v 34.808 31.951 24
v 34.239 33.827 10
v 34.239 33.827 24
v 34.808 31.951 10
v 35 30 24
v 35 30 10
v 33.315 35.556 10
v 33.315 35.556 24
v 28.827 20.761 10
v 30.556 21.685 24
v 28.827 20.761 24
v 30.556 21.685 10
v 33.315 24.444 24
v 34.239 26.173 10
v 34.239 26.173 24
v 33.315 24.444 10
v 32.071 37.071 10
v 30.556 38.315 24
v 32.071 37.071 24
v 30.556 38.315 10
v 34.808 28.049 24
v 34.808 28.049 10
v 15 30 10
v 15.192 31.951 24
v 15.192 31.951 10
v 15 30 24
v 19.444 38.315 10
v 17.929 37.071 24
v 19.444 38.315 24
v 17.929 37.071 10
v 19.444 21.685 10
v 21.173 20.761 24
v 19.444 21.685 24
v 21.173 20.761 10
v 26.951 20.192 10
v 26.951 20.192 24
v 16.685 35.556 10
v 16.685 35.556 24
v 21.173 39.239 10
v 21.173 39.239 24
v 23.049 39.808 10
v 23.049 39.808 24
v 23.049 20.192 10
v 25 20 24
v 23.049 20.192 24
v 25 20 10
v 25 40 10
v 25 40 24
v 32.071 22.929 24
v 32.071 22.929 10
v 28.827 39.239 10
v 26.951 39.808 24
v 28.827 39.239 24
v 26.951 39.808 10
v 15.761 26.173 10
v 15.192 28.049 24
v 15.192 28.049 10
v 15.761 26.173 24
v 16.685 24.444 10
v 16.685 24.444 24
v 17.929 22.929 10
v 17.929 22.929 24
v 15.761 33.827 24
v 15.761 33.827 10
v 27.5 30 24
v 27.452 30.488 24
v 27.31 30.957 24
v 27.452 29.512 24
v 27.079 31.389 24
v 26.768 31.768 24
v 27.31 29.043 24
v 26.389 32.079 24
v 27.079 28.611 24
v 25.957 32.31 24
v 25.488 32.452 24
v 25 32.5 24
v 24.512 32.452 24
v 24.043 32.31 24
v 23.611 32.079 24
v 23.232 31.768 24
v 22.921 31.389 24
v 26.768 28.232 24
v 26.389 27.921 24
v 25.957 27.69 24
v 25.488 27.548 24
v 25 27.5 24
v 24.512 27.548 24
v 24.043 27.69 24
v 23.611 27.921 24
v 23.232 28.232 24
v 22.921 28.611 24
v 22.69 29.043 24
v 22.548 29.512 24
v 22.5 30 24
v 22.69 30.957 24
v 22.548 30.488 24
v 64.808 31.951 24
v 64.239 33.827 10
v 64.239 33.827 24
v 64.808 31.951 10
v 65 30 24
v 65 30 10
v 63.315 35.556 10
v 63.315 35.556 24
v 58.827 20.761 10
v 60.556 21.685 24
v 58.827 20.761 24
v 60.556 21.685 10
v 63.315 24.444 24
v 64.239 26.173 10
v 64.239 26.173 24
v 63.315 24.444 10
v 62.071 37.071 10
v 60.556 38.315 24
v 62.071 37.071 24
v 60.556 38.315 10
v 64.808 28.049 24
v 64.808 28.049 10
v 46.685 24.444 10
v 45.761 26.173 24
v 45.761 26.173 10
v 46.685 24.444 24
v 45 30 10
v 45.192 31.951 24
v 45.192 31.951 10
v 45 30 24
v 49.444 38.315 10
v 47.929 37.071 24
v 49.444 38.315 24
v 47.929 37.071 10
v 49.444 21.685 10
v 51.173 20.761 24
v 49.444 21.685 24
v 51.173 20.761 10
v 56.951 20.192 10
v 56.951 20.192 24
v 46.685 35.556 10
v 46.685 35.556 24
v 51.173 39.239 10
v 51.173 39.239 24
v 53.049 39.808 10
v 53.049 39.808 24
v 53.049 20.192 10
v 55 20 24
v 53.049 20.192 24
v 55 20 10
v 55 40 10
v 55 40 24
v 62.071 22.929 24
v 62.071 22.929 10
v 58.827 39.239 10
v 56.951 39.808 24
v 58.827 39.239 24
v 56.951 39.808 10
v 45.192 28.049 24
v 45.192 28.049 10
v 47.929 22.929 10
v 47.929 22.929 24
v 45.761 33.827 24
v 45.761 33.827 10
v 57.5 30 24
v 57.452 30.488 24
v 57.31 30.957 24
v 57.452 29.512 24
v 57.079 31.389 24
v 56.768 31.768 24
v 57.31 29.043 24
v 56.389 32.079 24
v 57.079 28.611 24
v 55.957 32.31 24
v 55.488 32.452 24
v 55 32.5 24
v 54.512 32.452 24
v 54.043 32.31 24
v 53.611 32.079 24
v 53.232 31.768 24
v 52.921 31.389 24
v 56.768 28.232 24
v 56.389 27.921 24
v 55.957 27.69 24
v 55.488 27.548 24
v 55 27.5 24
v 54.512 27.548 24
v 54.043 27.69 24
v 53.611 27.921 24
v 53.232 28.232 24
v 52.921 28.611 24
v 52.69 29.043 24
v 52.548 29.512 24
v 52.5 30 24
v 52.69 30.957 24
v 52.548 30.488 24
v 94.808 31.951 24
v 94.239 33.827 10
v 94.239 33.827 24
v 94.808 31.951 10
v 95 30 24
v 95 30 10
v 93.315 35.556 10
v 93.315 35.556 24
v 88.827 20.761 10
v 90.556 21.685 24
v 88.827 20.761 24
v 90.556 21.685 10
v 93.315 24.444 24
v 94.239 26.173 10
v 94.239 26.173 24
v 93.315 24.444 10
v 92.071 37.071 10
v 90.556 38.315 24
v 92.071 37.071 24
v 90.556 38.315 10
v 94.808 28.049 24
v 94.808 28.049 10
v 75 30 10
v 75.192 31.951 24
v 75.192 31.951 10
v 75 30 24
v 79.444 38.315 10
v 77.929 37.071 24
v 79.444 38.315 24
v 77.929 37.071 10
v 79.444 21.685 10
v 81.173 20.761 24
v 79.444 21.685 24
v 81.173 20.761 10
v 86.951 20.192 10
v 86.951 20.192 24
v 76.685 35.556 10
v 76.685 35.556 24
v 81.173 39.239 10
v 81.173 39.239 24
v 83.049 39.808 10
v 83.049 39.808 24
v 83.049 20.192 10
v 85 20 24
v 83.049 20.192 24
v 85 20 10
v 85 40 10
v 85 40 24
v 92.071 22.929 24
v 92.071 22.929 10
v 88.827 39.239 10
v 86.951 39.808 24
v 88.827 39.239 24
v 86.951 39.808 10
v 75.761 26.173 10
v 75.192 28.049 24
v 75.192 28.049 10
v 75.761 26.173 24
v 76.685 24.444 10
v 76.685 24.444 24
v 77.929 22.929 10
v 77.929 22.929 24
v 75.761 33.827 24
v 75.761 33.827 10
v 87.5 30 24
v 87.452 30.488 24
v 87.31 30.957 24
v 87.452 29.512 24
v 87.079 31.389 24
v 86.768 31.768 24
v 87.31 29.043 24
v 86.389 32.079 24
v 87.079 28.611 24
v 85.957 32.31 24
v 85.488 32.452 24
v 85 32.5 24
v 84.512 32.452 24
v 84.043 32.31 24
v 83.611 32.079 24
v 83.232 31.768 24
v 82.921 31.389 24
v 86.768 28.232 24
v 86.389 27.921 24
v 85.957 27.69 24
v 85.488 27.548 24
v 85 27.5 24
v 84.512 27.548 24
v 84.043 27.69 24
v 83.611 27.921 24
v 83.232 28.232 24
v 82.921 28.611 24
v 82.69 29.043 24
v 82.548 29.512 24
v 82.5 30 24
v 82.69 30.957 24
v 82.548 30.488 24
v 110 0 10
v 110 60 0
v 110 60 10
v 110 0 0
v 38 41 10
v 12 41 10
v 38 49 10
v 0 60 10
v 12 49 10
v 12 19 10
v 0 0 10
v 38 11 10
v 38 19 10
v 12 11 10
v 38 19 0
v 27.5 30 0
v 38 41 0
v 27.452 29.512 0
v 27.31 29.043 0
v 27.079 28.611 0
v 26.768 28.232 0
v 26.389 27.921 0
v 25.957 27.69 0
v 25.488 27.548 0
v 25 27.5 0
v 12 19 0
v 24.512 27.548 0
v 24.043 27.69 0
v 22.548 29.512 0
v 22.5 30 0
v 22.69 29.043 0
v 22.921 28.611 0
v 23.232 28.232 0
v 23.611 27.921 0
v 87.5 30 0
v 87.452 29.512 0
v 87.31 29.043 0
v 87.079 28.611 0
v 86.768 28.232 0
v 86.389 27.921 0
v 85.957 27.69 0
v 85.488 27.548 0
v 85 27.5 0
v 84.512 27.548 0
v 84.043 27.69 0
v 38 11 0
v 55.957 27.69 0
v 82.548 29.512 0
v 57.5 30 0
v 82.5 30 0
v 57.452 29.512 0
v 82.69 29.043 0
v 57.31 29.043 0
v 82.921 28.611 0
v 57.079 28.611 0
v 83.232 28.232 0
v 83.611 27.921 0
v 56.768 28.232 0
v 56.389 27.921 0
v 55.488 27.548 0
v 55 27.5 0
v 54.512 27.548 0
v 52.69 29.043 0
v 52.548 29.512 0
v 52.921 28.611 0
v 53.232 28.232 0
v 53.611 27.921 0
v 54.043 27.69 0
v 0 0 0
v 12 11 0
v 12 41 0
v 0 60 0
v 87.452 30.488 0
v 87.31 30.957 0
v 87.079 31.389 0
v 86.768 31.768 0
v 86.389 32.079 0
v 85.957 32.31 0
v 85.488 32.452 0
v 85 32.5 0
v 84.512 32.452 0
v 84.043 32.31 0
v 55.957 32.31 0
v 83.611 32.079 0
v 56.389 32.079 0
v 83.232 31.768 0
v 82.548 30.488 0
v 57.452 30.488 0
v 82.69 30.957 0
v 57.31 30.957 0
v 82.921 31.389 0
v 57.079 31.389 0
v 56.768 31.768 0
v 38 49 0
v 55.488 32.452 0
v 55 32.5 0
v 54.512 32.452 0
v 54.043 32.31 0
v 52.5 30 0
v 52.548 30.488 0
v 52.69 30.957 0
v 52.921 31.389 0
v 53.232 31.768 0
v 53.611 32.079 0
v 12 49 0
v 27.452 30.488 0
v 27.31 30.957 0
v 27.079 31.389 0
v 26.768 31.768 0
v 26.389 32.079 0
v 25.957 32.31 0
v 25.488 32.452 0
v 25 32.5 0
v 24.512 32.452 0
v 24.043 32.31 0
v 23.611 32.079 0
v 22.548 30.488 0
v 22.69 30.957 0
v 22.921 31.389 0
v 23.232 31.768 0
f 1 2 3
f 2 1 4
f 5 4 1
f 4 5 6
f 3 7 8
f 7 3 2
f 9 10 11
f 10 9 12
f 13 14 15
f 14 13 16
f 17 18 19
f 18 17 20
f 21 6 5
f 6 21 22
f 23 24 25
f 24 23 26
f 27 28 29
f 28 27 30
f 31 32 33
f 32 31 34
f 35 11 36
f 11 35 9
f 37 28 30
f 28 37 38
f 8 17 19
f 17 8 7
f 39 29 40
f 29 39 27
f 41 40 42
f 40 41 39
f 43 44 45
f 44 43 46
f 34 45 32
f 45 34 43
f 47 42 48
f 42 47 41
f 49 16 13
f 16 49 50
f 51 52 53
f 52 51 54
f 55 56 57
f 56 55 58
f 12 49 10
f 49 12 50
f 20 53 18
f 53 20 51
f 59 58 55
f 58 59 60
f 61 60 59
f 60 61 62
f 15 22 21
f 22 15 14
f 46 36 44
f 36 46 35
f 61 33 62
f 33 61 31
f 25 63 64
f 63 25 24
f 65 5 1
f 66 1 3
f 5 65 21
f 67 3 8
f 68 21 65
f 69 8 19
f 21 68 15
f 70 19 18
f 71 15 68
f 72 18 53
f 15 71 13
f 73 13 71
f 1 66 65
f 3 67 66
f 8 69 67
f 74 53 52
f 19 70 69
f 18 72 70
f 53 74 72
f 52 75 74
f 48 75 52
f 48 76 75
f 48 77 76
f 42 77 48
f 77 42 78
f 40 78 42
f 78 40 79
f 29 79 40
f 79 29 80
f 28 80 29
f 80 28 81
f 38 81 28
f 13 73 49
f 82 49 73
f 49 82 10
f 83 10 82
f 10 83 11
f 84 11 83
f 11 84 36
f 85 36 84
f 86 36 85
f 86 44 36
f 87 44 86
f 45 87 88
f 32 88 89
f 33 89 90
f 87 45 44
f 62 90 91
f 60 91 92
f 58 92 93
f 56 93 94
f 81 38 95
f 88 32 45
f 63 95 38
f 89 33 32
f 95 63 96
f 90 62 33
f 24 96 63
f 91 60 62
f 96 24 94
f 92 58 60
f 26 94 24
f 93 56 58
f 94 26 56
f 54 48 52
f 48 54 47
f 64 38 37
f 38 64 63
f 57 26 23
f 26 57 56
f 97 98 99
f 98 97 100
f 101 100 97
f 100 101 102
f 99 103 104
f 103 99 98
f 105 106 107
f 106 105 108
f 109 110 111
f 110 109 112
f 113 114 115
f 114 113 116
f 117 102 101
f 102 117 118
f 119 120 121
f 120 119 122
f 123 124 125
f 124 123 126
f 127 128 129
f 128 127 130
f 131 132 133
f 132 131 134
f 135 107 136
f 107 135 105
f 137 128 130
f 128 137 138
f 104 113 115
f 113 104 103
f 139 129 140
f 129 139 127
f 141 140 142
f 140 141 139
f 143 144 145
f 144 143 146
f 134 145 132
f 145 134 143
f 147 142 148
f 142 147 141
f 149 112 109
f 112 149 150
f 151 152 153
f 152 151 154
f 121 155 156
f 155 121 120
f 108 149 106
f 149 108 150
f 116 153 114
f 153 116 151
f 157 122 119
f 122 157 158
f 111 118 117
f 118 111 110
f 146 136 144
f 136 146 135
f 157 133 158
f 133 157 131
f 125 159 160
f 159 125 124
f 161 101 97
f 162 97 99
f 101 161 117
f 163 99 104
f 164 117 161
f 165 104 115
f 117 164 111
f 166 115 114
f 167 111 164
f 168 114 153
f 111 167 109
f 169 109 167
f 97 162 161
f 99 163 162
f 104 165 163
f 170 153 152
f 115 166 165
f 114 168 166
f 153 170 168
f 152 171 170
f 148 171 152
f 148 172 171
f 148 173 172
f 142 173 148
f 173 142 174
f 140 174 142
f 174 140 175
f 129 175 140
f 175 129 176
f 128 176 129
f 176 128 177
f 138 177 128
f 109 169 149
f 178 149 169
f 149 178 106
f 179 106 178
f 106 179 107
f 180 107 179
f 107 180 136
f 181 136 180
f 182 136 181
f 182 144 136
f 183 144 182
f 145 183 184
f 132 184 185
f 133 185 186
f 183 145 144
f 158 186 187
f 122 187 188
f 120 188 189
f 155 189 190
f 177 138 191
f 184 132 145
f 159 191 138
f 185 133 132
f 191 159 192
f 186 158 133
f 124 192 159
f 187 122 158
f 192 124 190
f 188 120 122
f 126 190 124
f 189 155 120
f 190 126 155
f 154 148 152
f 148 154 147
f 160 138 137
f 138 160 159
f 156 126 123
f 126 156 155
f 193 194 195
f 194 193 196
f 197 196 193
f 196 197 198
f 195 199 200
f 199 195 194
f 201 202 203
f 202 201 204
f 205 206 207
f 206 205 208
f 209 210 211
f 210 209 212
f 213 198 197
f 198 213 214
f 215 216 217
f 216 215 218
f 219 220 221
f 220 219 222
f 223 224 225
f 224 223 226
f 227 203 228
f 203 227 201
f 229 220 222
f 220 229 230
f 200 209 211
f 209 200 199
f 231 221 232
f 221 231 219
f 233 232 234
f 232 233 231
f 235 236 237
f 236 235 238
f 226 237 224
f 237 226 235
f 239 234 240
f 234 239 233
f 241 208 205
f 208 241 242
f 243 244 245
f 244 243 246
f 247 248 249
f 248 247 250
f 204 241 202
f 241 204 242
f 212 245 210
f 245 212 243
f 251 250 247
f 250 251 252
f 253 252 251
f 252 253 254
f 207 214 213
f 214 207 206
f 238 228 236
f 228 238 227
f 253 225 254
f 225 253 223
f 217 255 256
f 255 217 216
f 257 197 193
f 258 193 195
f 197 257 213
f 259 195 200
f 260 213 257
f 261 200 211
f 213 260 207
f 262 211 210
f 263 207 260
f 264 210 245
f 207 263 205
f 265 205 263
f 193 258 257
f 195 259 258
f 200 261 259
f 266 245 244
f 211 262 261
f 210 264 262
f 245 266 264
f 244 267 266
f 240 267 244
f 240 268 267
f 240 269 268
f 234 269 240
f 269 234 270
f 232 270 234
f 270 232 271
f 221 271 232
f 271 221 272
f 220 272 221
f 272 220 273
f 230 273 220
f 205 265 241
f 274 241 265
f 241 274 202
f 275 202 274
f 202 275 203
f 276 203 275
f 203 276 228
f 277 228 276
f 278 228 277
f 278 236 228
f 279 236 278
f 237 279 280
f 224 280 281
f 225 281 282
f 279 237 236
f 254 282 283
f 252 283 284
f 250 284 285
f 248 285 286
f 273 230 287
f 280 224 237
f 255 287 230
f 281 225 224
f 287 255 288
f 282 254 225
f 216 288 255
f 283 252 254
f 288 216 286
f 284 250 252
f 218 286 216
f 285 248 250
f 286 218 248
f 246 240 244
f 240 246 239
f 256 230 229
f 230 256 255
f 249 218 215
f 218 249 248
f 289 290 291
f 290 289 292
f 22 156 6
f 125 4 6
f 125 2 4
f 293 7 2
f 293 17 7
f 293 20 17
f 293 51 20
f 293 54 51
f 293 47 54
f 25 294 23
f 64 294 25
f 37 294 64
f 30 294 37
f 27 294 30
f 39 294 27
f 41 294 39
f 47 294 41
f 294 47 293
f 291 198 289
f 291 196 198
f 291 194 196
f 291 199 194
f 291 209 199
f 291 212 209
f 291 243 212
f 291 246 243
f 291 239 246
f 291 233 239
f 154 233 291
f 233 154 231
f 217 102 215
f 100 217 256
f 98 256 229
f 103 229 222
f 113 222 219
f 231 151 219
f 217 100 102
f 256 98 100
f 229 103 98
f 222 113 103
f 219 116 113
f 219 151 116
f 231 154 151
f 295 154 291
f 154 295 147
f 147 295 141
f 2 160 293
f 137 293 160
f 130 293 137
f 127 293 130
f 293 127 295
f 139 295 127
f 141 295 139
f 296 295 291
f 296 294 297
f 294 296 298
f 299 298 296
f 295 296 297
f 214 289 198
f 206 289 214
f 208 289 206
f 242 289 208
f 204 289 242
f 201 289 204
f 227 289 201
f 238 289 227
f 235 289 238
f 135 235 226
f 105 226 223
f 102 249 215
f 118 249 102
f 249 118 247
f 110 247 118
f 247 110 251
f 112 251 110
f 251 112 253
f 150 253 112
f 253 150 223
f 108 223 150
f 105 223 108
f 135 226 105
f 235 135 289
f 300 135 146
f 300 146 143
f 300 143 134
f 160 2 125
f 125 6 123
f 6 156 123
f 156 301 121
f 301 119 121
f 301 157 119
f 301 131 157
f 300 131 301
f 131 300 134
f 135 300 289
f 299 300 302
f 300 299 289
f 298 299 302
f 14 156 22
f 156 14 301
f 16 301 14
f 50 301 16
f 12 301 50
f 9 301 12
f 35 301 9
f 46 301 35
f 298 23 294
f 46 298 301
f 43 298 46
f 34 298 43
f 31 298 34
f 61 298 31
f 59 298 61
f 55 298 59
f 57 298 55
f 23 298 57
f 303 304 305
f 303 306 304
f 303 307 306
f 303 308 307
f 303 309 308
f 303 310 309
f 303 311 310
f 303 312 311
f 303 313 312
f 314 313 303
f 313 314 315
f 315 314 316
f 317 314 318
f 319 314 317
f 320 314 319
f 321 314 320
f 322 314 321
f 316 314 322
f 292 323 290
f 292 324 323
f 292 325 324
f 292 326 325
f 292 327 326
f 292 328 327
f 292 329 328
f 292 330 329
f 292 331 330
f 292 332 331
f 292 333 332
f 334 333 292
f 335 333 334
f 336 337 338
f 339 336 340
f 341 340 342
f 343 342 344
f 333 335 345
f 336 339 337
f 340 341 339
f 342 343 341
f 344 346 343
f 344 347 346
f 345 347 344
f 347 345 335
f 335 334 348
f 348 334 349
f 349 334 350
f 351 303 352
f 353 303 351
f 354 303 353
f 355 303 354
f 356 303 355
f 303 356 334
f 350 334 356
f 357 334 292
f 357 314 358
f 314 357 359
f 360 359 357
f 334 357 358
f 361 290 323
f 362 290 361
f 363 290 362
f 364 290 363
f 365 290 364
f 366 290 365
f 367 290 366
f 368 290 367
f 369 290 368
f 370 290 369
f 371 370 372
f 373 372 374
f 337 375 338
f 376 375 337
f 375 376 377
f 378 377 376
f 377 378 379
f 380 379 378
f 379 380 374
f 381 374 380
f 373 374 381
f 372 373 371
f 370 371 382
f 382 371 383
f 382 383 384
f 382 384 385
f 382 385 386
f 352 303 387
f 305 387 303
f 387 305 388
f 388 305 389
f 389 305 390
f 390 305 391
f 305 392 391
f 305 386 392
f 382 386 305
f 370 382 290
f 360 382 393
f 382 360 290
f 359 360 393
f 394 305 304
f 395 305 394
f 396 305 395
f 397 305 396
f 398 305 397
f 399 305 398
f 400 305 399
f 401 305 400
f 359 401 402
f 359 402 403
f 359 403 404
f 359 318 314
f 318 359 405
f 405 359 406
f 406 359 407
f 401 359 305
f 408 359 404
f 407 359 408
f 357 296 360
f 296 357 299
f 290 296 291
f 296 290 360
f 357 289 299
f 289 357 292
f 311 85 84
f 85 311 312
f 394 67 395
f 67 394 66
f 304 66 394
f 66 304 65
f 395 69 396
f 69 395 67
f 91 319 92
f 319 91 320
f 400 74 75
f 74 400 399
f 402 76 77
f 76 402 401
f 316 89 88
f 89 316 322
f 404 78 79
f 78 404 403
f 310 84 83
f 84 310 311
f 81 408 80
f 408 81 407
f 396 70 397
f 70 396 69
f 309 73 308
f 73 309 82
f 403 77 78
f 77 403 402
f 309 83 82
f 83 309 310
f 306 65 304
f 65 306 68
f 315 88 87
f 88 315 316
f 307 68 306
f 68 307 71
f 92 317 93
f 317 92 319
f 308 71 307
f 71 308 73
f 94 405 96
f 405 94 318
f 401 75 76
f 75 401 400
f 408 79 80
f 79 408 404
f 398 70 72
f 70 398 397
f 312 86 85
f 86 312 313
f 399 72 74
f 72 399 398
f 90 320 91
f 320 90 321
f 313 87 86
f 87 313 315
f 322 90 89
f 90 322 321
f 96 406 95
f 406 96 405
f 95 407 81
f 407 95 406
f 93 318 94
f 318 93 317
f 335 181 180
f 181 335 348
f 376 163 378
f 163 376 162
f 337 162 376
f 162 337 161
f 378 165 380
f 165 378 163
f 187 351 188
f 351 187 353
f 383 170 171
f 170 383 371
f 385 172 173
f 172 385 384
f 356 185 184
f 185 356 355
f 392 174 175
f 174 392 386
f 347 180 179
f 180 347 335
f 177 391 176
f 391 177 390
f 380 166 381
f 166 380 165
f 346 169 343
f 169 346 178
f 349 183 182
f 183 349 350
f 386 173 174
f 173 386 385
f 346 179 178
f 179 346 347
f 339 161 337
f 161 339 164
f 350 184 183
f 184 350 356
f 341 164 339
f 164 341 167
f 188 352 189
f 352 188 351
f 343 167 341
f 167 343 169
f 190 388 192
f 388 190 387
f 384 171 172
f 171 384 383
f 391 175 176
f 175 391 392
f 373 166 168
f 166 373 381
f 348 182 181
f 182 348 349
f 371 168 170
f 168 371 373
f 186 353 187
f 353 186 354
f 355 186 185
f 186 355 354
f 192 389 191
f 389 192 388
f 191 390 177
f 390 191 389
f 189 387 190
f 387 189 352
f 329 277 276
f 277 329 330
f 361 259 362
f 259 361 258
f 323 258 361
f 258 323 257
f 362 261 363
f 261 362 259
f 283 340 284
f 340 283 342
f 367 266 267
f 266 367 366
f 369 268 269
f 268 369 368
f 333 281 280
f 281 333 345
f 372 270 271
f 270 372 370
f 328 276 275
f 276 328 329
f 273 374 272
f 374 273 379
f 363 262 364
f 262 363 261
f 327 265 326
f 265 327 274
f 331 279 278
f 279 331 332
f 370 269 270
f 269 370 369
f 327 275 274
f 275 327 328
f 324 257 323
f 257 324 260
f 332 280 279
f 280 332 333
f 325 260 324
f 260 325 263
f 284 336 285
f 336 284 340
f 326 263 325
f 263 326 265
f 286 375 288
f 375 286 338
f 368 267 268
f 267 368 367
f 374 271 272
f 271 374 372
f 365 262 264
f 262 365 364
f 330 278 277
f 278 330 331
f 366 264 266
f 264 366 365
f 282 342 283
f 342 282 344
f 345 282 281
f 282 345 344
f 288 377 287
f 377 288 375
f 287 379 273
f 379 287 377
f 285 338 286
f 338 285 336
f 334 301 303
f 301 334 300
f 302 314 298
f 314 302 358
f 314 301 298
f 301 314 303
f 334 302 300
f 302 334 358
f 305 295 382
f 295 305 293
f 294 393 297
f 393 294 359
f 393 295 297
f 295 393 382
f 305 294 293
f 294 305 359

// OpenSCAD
$fn = 32;

// ----------------------------------------------------------------------
// Drill jig: three_boss_slot jig
// ----------------------------------------------------------------------

// --- parameters (mm) ---
plate_l = 110;            // plate length, X
plate_w = 60;             // plate width, Y
plate_t = 10;             // plate thickness
boss_d = 20;              // guide boss diameter
boss_h = 15;              // boss height above the plate
guide_d = 5;              // guide hole diameter
boss_pitch = 30;          // boss pitch
slot_w = 8;               // clamp slot width
slot_l = 26;              // clamp slot length
slot_x = 12;              // slot start X

n_boss = 3;  // guide bosses
boss_x0 = (plate_l - (n_boss - 1) * boss_pitch) / 2;  // first boss X
boss_top = plate_t - 1 + boss_h;  // boss crown height
total_h = boss_top;  // overall height

difference() {
  union() {
  cube([plate_l, plate_w, plate_t]);
  for (i = [0 : n_boss - 1])
    translate([boss_x0 + i * boss_pitch, plate_w / 2, plate_t - 1])
      cylinder(h = boss_h, d = boss_d);
  }
  for (i = [0 : n_boss - 1])
    translate([boss_x0 + i * boss_pitch, plate_w / 2, -1])
      cylinder(h = plate_t + boss_h, d = guide_d);
  for (cy = [plate_w * 0.25, plate_w * 0.75])
    translate([slot_x, cy - slot_w / 2, -1])
      cube([slot_l, slot_w, plate_t + 2]);
}
